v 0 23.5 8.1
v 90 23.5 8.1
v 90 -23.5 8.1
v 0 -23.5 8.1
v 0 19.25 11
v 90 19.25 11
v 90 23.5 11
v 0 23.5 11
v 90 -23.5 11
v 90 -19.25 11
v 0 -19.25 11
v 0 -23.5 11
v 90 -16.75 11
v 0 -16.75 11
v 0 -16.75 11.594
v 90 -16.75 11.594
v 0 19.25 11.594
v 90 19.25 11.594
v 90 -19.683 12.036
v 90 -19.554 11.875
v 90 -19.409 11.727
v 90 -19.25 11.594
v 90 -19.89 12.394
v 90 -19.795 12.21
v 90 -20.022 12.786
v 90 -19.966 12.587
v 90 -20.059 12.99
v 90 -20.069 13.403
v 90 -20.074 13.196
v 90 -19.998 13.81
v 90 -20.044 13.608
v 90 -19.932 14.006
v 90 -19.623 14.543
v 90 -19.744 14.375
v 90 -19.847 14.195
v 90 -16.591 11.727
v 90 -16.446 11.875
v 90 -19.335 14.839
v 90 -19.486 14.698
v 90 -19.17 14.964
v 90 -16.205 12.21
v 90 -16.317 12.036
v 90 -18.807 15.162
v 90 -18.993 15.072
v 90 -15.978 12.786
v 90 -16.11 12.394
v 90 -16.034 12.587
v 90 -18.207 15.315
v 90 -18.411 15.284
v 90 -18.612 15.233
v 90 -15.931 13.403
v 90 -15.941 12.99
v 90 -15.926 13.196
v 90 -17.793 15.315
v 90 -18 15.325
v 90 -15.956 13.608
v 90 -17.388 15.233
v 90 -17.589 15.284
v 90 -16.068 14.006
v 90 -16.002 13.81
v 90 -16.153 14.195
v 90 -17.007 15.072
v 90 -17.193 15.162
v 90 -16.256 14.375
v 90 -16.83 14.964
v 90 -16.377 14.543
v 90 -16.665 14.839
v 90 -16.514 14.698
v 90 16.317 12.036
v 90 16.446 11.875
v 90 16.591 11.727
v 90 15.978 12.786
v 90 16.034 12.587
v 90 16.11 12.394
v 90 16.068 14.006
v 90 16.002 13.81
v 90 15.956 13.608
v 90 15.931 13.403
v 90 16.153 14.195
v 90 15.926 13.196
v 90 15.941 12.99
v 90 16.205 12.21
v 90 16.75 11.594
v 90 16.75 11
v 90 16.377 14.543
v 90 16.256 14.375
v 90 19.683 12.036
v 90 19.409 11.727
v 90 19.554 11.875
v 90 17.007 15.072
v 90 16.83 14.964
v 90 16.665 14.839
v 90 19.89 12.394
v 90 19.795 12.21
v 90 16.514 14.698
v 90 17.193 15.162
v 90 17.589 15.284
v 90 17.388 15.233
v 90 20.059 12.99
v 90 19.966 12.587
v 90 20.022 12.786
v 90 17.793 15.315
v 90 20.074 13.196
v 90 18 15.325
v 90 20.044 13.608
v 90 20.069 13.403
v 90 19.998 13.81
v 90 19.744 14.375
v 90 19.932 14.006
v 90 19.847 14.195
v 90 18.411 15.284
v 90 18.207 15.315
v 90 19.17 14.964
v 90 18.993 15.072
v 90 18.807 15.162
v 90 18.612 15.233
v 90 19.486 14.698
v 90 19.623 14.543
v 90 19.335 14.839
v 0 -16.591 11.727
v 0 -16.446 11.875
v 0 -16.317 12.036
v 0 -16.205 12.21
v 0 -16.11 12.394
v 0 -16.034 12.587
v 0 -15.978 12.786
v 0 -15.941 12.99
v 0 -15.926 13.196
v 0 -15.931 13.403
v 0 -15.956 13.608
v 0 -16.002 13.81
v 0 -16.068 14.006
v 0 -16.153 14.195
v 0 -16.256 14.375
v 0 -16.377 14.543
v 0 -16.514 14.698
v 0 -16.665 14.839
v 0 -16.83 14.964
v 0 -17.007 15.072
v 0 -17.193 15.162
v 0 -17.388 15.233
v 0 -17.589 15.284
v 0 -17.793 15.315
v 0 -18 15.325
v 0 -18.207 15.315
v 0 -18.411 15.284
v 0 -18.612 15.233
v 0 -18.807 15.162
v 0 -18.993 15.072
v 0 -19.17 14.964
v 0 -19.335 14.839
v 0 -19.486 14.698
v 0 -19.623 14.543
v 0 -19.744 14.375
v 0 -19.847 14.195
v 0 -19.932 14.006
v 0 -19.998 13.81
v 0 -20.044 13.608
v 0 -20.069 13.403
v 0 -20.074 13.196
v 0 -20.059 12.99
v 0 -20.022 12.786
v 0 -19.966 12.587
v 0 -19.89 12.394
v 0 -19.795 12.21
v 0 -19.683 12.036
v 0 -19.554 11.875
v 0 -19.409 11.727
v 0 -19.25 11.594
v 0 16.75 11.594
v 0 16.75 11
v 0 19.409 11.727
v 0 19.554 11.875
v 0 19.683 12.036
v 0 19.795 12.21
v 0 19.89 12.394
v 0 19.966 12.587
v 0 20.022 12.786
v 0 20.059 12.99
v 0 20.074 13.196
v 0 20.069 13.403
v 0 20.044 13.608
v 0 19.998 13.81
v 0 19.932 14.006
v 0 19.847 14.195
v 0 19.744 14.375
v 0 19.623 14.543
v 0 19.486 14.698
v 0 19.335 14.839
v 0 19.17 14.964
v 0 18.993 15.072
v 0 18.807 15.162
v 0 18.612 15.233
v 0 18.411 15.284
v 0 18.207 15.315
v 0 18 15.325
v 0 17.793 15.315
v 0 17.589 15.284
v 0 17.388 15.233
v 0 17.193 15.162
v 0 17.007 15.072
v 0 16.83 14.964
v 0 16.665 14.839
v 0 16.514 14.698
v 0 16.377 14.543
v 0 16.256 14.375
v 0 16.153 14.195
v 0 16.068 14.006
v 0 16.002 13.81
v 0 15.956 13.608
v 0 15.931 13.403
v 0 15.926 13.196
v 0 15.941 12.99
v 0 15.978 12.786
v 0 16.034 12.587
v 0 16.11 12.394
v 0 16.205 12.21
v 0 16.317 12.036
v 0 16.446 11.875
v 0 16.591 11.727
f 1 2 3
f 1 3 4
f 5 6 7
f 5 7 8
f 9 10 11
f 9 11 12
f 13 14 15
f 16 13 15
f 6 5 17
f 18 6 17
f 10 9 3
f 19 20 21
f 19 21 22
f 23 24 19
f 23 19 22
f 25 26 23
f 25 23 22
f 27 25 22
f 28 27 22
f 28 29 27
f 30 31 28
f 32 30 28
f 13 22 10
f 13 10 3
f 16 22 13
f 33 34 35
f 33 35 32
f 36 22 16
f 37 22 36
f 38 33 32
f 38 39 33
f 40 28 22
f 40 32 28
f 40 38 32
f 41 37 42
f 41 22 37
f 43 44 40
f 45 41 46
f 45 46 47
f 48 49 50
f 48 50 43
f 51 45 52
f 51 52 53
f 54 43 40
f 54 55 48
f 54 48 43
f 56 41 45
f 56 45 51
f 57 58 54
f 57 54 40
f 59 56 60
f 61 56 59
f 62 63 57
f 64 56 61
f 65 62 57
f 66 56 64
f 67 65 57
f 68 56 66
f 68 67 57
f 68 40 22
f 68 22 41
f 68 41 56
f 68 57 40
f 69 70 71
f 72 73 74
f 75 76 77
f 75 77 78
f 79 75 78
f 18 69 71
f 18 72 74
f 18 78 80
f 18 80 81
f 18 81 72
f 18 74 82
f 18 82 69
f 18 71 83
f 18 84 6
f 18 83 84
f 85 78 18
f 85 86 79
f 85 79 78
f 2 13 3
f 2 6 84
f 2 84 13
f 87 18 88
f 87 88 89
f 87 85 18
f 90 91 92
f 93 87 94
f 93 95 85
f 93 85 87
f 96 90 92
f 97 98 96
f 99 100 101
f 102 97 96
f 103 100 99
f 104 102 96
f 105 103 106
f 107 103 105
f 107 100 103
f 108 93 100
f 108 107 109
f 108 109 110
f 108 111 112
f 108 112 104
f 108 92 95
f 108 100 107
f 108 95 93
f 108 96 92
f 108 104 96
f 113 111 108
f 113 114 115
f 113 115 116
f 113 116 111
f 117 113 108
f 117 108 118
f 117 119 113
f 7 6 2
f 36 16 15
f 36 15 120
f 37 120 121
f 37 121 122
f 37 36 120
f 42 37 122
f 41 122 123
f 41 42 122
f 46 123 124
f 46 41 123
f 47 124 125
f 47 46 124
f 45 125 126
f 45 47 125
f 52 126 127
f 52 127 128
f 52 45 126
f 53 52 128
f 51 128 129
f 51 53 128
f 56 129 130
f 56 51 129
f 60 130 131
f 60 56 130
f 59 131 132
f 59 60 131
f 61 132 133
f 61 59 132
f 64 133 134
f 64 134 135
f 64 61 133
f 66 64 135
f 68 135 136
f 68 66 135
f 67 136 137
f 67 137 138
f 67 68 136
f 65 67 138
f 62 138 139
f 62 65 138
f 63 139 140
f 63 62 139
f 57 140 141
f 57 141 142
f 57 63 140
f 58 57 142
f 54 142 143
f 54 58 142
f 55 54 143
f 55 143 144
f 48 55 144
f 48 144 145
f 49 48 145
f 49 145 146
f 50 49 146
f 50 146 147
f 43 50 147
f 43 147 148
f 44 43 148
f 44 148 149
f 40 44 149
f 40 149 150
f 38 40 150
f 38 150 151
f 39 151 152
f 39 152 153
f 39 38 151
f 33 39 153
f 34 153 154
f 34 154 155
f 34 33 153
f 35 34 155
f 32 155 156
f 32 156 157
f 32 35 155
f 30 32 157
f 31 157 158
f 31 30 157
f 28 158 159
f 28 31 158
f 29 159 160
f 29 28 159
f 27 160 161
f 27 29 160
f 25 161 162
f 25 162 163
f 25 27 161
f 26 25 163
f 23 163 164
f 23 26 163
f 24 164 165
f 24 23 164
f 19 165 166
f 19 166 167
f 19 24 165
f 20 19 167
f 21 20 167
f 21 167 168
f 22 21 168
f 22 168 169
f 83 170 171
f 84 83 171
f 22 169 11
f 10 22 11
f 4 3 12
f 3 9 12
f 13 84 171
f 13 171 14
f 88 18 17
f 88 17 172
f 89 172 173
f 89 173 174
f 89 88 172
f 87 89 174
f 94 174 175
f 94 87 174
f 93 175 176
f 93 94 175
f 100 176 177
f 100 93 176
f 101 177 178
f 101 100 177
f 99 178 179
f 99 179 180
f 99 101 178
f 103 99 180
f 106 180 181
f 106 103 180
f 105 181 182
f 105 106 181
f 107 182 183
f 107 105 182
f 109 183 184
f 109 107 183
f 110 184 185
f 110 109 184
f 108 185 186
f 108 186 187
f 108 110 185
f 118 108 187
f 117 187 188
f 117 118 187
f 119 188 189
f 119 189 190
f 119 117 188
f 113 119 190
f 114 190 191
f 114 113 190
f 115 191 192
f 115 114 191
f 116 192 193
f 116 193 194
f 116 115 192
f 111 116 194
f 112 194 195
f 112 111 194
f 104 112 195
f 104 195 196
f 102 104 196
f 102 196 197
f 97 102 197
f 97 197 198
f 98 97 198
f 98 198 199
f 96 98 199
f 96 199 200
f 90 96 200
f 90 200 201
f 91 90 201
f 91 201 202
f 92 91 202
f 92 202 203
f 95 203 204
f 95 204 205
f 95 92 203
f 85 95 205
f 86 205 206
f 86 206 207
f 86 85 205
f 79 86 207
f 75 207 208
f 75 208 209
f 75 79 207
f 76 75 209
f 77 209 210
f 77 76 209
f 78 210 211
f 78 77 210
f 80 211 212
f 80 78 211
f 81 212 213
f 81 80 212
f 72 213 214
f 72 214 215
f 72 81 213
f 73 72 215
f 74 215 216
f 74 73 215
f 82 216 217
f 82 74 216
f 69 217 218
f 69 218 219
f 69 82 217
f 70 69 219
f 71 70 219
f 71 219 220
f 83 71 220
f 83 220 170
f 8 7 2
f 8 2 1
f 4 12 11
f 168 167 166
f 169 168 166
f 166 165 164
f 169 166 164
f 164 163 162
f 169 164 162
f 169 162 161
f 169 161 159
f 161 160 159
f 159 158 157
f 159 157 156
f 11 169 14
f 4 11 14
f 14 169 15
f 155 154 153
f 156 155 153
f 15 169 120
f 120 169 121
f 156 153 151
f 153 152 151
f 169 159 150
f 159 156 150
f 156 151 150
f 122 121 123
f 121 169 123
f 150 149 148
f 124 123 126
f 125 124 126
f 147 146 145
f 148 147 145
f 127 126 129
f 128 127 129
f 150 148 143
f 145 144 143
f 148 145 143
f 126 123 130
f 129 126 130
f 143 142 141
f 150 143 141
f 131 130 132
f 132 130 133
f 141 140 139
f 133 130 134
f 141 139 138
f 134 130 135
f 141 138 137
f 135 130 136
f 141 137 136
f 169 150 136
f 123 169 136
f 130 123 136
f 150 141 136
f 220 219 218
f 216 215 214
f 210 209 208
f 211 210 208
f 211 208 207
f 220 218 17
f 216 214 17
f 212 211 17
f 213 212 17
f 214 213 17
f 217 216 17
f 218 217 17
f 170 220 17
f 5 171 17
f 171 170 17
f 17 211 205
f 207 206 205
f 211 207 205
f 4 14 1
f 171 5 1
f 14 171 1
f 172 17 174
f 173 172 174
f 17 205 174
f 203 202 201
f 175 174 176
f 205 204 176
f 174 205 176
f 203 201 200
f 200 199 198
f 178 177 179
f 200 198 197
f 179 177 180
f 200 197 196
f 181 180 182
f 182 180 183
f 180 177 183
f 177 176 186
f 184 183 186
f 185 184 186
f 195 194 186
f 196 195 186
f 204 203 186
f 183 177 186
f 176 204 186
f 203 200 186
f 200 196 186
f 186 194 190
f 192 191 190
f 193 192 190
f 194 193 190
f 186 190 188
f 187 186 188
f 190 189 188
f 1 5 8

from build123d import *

# Parameters (mm, degrees)
EXTRUDE_1_DEPTH             = 90
SKETCH_2_W                  = 90
SKETCH_2_H                  = 17.75
EXTRUDE_2_DEPTH             = 8.2
SKETCH_3_W                  = 90
SKETCH_3_H                  = 50.95
EXTRUDE_3_DEPTH             = 8.2
SKETCH_4_W                  = 3.95
SKETCH_4_H                  = 29.5
CUT_EXTRUDE_1_DEPTH         = 96.44153315
SKETCH_5_W                  = 3.95
SKETCH_5_H                  = 6.2
CUT_EXTRUDE_2_DEPTH         = 96.44153315
SKETCH_6_W                  = 2.25
SKETCH_6_H                  = 3.95
CUT_EXTRUDE_3_DEPTH         = 96.44153315
SKETCH_7_W                  = 4.5
SKETCH_7_H                  = 3.95
CUT_EXTRUDE_4_DEPTH         = 96.44153315
SKETCH_8_W                  = 2.25
SKETCH_8_H                  = 3.95
CUT_EXTRUDE_5_DEPTH         = 96.44153315
SKETCH_9_W                  = 3.95
SKETCH_9_H                  = 2.25
CUT_EXTRUDE_6_DEPTH         = 96.44153315
SKETCH_10_W                 = 20.2
SKETCH_10_H                 = 45.2
CUT_EXTRUDE_7_DEPTH         = 86
HOLE_WIZARD_2_5_2_5_1_D     = 2.5
HOLE_WIZARD_4_5_4_5_1_D     = 4.5
HOLE_WIZARD_8_3_8_3_1_D     = 8.3
HOLE_WIZARD_8_3_8_3_1_DEPTH = 3.2
FILLET_1_R                  = 2
FILLET_2_R                  = 2
EXTRUDE_START               = -90
SKETCH_17_R                 = 1.25
EXTRUDE_4_DEPTH             = 90
CUT_EXTRUDE_START           = -100
SKETCH_18_R                 = 4.15
CUT_EXTRUDE_8_DEPTH         = 100
CUT_EXTRUDE_11_DEPTH        = 108
CUT_EXTRUDE_12_DEPTH        = 108
SKETCH_21_W                 = 90
SKETCH_21_H                 = 47
EXTRUDE_5_DEPTH             = 2


with BuildPart() as part:
    # Эскиз1 → Бобышка-Вытянуть1 (new body)
    with BuildSketch(Plane(origin=(90, 0, 0), x_dir=(0, 0, -1), z_dir=(1, 0, 0))):
        with BuildLine():
            Line((6.75, -24.093761792), (6.75, 19.25))
            Line((6.75, 19.25), (-11.593761792, 19.25))
            ThreePointArc((-11.593761792, 19.25), (-15.325, 18), (-11.593761792, 16.75))
            Line((-11.593761792, 16.75), (-11, 16.75))
            Line((-11, 16.75), (-11, -16.75))
            Line((-11, -16.75), (-11.593761792, -16.75))
            ThreePointArc((-11.593761792, -16.75), (-15.325, -18), (-11.593761792, -19.25))
            Line((-11.593761792, -19.25), (-11, -19.25))
            Line((-11, -19.25), (-11, -23.5))
            Line((-11, -23.5), (-6.75, -23.5))
            Line((-6.75, -23.5), (-6.75, -24.093761792))
            ThreePointArc((-6.75, -24.093761792), (-5.5, -27.825), (-4.25, -24.093761792))
            Line((-4.25, -24.093761792), (-4.25, -23.5))
            Line((-4.25, -23.5), (4.25, -23.5))
            Line((4.25, -23.5), (4.25, -24.093761792))
            ThreePointArc((4.25, -24.093761792), (5.5, -27.825), (6.75, -24.093761792))
        make_face()
    extrude(amount=-EXTRUDE_1_DEPTH)

    # Эскиз2 → Бобышка-Вытянуть2 (add)
    with BuildSketch(Plane(origin=(0, 19.25, 0), x_dir=(-1, 0, 0), z_dir=(0, 1, 0))):
        with Locations((-45, 2.125)):
            Rectangle(SKETCH_2_W, SKETCH_2_H)
    extrude(amount=EXTRUDE_2_DEPTH)

    # Эскиз3 → Бобышка-Вытянуть3 (add)
    with BuildSketch(Plane(origin=(0, 0, -6.75), x_dir=(-1, 0, 0), z_dir=(0, 0, -1))):
        with Locations((-45, 1.975)):
            Rectangle(SKETCH_3_W, SKETCH_3_H)
    extrude(amount=EXTRUDE_3_DEPTH)

    # Эскиз4 → Вырез-Вытянуть1 (cut, through all)
    with BuildSketch(Plane.ZY):
        with Locations((-12.975, 0)):
            Rectangle(SKETCH_4_W, SKETCH_4_H)
    extrude(amount=-CUT_EXTRUDE_1_DEPTH, mode=Mode.SUBTRACT)

    # Эскиз5 → Вырез-Вытянуть2 (cut, through all)
    with BuildSketch(Plane.ZY):
        with Locations((-12.975, 24.35)):
            Rectangle(SKETCH_5_W, SKETCH_5_H)
    extrude(amount=-CUT_EXTRUDE_2_DEPTH, mode=Mode.SUBTRACT)

    # Эскиз6 → Вырез-Вытянуть3 (cut, through all)
    with BuildSketch(Plane.ZY):
        with Locations((-9.875, 25.475)):
            Rectangle(SKETCH_6_W, SKETCH_6_H)
    extrude(amount=-CUT_EXTRUDE_3_DEPTH, mode=Mode.SUBTRACT)

    # Эскиз7 → Вырез-Вытянуть4 (cut, through all)
    with BuildSketch(Plane.ZY):
        with Locations((0, 25.475)):
            Rectangle(SKETCH_7_W, SKETCH_7_H)
    extrude(amount=-CUT_EXTRUDE_4_DEPTH, mode=Mode.SUBTRACT)

    # Эскиз8 → Вырез-Вытянуть5 (cut, through all)
    with BuildSketch(Plane.ZY):
        with Locations((9.875, 25.475)):
            Rectangle(SKETCH_8_W, SKETCH_8_H)
    extrude(amount=-CUT_EXTRUDE_5_DEPTH, mode=Mode.SUBTRACT)

    # Эскиз9 → Вырез-Вытянуть6 (cut, through all)
    with BuildSketch(Plane.ZY):
        with Locations((-12.975, -22.375)):
            Rectangle(SKETCH_9_W, SKETCH_9_H)
    extrude(amount=-CUT_EXTRUDE_6_DEPTH, mode=Mode.SUBTRACT)

    # Эскиз10 → Вырез-Вытянуть7 (cut)
    with BuildSketch(Plane(origin=(90, 0, 0), x_dir=(0, 0, -1), z_dir=(1, 0, 0))):
        Rectangle(SKETCH_10_W, SKETCH_10_H)
    extrude(amount=-CUT_EXTRUDE_7_DEPTH, mode=Mode.SUBTRACT)

    # Диаметр отверстия Ø2.5 (2.5)1 (through all)
    with Locations(Plane(origin=(90, 0, 0), x_dir=(0, 0, -1), z_dir=(1, 0, 0))):
        with Locations((5.5, -25.75), (-13.25, -18), (-5.5, -25.75), (-13.25, 18)):
            Hole(HOLE_WIZARD_2_5_2_5_1_D / 2)

    # Диаметр отверстия Ø4.5 (4.5)1 (through all)
    with Locations(Plane.ZY):
        with Locations((-13.25, -18), (-13.25, 18), (-5.5, 25.75), (5.5, 25.75)):
            Hole(HOLE_WIZARD_4_5_4_5_1_D / 2)

    # Диаметр отверстия Ø8.3 (8.3)1
    with Locations(Plane.ZY):
        with Locations((0, 0)):
            Hole(HOLE_WIZARD_8_3_8_3_1_D / 2, depth=HOLE_WIZARD_8_3_8_3_1_DEPTH)

    # Скругление1
    fillet_1_edges = [part.edges().sort_by_distance(p)[0] for p in [
        (45, 23.5, 8.75),
    ]]
    fillet(fillet_1_edges, radius=FILLET_1_R)

    # Скругление2
    fillet_2_edges = [part.edges().sort_by_distance(p)[0] for p in [
        (45, 23.5, -8.75),
        (45, 23.5, 2.25),
        (45, 23.5, -2.25),
        (45, -21.25, -11),
        (4, 0, -10.1),
        (4, -22.6, 0),
        (4, 0, 10.1),
        (4, 22.6, 0),
        (45, 14.75, -11),
        (45, -14.75, -11),
        (45, 21.25, -11),
    ]]
    fillet(fillet_2_edges, radius=FILLET_2_R)

    # Эскиз17 → Бобышка-Вытянуть4 (add)
    with BuildSketch(Plane(origin=(90, 0, 0), x_dir=(0, 0, -1), z_dir=(1, 0, 0)).offset(EXTRUDE_START)):
        with Locations((5.5, -25.75)):
            Circle(SKETCH_17_R)
        with Locations((-5.5, -25.75)):
            Circle(SKETCH_17_R)
        with Locations((-13.25, -18)):
            Circle(SKETCH_17_R)
        with Locations((-13.25, 18)):
            Circle(SKETCH_17_R)
    extrude(amount=EXTRUDE_4_DEPTH)

    # Эскиз18 → Вырез-Вытянуть8 (cut)
    with BuildSketch(Plane.ZY.offset(CUT_EXTRUDE_START)):
        Circle(SKETCH_18_R)
    extrude(amount=CUT_EXTRUDE_8_DEPTH, mode=Mode.SUBTRACT)

    # Эскиз19 → Вырез-Вытянуть11 (cut)
    with BuildSketch(Plane(origin=(90, 0, 0), x_dir=(0, 0, -1), z_dir=(1, 0, 0))):
        Polygon((-10.1, -22.6), (-10.1, 22.6), (-10.1, 31.781046402), (18.117629079, 31.781046402), (18.667008159, -30.769686003), (-10.1, -30.769686003), align=None)
    extrude(amount=-CUT_EXTRUDE_11_DEPTH, mode=Mode.SUBTRACT)

    # Эскиз20 → Вырез-Вытянуть12 (cut)
    with BuildSketch(Plane(origin=(90, 0, 0), x_dir=(0, 0, -1), z_dir=(1, 0, 0))):
        with BuildLine():
            Line((-10.75, 23.5), (-10.1, 23.5))
            Line((-10.1, 23.5), (-10.1, 23.608571968))
            ThreePointArc((-10.1, 23.608571968), (-10.420497393, 23.52732972), (-10.75, 23.5))
        make_face()
    extrude(amount=-CUT_EXTRUDE_12_DEPTH, mode=Mode.SUBTRACT)

    # Эскиз21 → Бобышка-Вытянуть5 (add)
    with BuildSketch(Plane(origin=(0, 0, 10.1), x_dir=(-1, 0, 0), z_dir=(0, 0, -1))):
        with Locations((-45, 0)):
            Rectangle(SKETCH_21_W, SKETCH_21_H)
    extrude(amount=EXTRUDE_5_DEPTH)


solid = part.part
